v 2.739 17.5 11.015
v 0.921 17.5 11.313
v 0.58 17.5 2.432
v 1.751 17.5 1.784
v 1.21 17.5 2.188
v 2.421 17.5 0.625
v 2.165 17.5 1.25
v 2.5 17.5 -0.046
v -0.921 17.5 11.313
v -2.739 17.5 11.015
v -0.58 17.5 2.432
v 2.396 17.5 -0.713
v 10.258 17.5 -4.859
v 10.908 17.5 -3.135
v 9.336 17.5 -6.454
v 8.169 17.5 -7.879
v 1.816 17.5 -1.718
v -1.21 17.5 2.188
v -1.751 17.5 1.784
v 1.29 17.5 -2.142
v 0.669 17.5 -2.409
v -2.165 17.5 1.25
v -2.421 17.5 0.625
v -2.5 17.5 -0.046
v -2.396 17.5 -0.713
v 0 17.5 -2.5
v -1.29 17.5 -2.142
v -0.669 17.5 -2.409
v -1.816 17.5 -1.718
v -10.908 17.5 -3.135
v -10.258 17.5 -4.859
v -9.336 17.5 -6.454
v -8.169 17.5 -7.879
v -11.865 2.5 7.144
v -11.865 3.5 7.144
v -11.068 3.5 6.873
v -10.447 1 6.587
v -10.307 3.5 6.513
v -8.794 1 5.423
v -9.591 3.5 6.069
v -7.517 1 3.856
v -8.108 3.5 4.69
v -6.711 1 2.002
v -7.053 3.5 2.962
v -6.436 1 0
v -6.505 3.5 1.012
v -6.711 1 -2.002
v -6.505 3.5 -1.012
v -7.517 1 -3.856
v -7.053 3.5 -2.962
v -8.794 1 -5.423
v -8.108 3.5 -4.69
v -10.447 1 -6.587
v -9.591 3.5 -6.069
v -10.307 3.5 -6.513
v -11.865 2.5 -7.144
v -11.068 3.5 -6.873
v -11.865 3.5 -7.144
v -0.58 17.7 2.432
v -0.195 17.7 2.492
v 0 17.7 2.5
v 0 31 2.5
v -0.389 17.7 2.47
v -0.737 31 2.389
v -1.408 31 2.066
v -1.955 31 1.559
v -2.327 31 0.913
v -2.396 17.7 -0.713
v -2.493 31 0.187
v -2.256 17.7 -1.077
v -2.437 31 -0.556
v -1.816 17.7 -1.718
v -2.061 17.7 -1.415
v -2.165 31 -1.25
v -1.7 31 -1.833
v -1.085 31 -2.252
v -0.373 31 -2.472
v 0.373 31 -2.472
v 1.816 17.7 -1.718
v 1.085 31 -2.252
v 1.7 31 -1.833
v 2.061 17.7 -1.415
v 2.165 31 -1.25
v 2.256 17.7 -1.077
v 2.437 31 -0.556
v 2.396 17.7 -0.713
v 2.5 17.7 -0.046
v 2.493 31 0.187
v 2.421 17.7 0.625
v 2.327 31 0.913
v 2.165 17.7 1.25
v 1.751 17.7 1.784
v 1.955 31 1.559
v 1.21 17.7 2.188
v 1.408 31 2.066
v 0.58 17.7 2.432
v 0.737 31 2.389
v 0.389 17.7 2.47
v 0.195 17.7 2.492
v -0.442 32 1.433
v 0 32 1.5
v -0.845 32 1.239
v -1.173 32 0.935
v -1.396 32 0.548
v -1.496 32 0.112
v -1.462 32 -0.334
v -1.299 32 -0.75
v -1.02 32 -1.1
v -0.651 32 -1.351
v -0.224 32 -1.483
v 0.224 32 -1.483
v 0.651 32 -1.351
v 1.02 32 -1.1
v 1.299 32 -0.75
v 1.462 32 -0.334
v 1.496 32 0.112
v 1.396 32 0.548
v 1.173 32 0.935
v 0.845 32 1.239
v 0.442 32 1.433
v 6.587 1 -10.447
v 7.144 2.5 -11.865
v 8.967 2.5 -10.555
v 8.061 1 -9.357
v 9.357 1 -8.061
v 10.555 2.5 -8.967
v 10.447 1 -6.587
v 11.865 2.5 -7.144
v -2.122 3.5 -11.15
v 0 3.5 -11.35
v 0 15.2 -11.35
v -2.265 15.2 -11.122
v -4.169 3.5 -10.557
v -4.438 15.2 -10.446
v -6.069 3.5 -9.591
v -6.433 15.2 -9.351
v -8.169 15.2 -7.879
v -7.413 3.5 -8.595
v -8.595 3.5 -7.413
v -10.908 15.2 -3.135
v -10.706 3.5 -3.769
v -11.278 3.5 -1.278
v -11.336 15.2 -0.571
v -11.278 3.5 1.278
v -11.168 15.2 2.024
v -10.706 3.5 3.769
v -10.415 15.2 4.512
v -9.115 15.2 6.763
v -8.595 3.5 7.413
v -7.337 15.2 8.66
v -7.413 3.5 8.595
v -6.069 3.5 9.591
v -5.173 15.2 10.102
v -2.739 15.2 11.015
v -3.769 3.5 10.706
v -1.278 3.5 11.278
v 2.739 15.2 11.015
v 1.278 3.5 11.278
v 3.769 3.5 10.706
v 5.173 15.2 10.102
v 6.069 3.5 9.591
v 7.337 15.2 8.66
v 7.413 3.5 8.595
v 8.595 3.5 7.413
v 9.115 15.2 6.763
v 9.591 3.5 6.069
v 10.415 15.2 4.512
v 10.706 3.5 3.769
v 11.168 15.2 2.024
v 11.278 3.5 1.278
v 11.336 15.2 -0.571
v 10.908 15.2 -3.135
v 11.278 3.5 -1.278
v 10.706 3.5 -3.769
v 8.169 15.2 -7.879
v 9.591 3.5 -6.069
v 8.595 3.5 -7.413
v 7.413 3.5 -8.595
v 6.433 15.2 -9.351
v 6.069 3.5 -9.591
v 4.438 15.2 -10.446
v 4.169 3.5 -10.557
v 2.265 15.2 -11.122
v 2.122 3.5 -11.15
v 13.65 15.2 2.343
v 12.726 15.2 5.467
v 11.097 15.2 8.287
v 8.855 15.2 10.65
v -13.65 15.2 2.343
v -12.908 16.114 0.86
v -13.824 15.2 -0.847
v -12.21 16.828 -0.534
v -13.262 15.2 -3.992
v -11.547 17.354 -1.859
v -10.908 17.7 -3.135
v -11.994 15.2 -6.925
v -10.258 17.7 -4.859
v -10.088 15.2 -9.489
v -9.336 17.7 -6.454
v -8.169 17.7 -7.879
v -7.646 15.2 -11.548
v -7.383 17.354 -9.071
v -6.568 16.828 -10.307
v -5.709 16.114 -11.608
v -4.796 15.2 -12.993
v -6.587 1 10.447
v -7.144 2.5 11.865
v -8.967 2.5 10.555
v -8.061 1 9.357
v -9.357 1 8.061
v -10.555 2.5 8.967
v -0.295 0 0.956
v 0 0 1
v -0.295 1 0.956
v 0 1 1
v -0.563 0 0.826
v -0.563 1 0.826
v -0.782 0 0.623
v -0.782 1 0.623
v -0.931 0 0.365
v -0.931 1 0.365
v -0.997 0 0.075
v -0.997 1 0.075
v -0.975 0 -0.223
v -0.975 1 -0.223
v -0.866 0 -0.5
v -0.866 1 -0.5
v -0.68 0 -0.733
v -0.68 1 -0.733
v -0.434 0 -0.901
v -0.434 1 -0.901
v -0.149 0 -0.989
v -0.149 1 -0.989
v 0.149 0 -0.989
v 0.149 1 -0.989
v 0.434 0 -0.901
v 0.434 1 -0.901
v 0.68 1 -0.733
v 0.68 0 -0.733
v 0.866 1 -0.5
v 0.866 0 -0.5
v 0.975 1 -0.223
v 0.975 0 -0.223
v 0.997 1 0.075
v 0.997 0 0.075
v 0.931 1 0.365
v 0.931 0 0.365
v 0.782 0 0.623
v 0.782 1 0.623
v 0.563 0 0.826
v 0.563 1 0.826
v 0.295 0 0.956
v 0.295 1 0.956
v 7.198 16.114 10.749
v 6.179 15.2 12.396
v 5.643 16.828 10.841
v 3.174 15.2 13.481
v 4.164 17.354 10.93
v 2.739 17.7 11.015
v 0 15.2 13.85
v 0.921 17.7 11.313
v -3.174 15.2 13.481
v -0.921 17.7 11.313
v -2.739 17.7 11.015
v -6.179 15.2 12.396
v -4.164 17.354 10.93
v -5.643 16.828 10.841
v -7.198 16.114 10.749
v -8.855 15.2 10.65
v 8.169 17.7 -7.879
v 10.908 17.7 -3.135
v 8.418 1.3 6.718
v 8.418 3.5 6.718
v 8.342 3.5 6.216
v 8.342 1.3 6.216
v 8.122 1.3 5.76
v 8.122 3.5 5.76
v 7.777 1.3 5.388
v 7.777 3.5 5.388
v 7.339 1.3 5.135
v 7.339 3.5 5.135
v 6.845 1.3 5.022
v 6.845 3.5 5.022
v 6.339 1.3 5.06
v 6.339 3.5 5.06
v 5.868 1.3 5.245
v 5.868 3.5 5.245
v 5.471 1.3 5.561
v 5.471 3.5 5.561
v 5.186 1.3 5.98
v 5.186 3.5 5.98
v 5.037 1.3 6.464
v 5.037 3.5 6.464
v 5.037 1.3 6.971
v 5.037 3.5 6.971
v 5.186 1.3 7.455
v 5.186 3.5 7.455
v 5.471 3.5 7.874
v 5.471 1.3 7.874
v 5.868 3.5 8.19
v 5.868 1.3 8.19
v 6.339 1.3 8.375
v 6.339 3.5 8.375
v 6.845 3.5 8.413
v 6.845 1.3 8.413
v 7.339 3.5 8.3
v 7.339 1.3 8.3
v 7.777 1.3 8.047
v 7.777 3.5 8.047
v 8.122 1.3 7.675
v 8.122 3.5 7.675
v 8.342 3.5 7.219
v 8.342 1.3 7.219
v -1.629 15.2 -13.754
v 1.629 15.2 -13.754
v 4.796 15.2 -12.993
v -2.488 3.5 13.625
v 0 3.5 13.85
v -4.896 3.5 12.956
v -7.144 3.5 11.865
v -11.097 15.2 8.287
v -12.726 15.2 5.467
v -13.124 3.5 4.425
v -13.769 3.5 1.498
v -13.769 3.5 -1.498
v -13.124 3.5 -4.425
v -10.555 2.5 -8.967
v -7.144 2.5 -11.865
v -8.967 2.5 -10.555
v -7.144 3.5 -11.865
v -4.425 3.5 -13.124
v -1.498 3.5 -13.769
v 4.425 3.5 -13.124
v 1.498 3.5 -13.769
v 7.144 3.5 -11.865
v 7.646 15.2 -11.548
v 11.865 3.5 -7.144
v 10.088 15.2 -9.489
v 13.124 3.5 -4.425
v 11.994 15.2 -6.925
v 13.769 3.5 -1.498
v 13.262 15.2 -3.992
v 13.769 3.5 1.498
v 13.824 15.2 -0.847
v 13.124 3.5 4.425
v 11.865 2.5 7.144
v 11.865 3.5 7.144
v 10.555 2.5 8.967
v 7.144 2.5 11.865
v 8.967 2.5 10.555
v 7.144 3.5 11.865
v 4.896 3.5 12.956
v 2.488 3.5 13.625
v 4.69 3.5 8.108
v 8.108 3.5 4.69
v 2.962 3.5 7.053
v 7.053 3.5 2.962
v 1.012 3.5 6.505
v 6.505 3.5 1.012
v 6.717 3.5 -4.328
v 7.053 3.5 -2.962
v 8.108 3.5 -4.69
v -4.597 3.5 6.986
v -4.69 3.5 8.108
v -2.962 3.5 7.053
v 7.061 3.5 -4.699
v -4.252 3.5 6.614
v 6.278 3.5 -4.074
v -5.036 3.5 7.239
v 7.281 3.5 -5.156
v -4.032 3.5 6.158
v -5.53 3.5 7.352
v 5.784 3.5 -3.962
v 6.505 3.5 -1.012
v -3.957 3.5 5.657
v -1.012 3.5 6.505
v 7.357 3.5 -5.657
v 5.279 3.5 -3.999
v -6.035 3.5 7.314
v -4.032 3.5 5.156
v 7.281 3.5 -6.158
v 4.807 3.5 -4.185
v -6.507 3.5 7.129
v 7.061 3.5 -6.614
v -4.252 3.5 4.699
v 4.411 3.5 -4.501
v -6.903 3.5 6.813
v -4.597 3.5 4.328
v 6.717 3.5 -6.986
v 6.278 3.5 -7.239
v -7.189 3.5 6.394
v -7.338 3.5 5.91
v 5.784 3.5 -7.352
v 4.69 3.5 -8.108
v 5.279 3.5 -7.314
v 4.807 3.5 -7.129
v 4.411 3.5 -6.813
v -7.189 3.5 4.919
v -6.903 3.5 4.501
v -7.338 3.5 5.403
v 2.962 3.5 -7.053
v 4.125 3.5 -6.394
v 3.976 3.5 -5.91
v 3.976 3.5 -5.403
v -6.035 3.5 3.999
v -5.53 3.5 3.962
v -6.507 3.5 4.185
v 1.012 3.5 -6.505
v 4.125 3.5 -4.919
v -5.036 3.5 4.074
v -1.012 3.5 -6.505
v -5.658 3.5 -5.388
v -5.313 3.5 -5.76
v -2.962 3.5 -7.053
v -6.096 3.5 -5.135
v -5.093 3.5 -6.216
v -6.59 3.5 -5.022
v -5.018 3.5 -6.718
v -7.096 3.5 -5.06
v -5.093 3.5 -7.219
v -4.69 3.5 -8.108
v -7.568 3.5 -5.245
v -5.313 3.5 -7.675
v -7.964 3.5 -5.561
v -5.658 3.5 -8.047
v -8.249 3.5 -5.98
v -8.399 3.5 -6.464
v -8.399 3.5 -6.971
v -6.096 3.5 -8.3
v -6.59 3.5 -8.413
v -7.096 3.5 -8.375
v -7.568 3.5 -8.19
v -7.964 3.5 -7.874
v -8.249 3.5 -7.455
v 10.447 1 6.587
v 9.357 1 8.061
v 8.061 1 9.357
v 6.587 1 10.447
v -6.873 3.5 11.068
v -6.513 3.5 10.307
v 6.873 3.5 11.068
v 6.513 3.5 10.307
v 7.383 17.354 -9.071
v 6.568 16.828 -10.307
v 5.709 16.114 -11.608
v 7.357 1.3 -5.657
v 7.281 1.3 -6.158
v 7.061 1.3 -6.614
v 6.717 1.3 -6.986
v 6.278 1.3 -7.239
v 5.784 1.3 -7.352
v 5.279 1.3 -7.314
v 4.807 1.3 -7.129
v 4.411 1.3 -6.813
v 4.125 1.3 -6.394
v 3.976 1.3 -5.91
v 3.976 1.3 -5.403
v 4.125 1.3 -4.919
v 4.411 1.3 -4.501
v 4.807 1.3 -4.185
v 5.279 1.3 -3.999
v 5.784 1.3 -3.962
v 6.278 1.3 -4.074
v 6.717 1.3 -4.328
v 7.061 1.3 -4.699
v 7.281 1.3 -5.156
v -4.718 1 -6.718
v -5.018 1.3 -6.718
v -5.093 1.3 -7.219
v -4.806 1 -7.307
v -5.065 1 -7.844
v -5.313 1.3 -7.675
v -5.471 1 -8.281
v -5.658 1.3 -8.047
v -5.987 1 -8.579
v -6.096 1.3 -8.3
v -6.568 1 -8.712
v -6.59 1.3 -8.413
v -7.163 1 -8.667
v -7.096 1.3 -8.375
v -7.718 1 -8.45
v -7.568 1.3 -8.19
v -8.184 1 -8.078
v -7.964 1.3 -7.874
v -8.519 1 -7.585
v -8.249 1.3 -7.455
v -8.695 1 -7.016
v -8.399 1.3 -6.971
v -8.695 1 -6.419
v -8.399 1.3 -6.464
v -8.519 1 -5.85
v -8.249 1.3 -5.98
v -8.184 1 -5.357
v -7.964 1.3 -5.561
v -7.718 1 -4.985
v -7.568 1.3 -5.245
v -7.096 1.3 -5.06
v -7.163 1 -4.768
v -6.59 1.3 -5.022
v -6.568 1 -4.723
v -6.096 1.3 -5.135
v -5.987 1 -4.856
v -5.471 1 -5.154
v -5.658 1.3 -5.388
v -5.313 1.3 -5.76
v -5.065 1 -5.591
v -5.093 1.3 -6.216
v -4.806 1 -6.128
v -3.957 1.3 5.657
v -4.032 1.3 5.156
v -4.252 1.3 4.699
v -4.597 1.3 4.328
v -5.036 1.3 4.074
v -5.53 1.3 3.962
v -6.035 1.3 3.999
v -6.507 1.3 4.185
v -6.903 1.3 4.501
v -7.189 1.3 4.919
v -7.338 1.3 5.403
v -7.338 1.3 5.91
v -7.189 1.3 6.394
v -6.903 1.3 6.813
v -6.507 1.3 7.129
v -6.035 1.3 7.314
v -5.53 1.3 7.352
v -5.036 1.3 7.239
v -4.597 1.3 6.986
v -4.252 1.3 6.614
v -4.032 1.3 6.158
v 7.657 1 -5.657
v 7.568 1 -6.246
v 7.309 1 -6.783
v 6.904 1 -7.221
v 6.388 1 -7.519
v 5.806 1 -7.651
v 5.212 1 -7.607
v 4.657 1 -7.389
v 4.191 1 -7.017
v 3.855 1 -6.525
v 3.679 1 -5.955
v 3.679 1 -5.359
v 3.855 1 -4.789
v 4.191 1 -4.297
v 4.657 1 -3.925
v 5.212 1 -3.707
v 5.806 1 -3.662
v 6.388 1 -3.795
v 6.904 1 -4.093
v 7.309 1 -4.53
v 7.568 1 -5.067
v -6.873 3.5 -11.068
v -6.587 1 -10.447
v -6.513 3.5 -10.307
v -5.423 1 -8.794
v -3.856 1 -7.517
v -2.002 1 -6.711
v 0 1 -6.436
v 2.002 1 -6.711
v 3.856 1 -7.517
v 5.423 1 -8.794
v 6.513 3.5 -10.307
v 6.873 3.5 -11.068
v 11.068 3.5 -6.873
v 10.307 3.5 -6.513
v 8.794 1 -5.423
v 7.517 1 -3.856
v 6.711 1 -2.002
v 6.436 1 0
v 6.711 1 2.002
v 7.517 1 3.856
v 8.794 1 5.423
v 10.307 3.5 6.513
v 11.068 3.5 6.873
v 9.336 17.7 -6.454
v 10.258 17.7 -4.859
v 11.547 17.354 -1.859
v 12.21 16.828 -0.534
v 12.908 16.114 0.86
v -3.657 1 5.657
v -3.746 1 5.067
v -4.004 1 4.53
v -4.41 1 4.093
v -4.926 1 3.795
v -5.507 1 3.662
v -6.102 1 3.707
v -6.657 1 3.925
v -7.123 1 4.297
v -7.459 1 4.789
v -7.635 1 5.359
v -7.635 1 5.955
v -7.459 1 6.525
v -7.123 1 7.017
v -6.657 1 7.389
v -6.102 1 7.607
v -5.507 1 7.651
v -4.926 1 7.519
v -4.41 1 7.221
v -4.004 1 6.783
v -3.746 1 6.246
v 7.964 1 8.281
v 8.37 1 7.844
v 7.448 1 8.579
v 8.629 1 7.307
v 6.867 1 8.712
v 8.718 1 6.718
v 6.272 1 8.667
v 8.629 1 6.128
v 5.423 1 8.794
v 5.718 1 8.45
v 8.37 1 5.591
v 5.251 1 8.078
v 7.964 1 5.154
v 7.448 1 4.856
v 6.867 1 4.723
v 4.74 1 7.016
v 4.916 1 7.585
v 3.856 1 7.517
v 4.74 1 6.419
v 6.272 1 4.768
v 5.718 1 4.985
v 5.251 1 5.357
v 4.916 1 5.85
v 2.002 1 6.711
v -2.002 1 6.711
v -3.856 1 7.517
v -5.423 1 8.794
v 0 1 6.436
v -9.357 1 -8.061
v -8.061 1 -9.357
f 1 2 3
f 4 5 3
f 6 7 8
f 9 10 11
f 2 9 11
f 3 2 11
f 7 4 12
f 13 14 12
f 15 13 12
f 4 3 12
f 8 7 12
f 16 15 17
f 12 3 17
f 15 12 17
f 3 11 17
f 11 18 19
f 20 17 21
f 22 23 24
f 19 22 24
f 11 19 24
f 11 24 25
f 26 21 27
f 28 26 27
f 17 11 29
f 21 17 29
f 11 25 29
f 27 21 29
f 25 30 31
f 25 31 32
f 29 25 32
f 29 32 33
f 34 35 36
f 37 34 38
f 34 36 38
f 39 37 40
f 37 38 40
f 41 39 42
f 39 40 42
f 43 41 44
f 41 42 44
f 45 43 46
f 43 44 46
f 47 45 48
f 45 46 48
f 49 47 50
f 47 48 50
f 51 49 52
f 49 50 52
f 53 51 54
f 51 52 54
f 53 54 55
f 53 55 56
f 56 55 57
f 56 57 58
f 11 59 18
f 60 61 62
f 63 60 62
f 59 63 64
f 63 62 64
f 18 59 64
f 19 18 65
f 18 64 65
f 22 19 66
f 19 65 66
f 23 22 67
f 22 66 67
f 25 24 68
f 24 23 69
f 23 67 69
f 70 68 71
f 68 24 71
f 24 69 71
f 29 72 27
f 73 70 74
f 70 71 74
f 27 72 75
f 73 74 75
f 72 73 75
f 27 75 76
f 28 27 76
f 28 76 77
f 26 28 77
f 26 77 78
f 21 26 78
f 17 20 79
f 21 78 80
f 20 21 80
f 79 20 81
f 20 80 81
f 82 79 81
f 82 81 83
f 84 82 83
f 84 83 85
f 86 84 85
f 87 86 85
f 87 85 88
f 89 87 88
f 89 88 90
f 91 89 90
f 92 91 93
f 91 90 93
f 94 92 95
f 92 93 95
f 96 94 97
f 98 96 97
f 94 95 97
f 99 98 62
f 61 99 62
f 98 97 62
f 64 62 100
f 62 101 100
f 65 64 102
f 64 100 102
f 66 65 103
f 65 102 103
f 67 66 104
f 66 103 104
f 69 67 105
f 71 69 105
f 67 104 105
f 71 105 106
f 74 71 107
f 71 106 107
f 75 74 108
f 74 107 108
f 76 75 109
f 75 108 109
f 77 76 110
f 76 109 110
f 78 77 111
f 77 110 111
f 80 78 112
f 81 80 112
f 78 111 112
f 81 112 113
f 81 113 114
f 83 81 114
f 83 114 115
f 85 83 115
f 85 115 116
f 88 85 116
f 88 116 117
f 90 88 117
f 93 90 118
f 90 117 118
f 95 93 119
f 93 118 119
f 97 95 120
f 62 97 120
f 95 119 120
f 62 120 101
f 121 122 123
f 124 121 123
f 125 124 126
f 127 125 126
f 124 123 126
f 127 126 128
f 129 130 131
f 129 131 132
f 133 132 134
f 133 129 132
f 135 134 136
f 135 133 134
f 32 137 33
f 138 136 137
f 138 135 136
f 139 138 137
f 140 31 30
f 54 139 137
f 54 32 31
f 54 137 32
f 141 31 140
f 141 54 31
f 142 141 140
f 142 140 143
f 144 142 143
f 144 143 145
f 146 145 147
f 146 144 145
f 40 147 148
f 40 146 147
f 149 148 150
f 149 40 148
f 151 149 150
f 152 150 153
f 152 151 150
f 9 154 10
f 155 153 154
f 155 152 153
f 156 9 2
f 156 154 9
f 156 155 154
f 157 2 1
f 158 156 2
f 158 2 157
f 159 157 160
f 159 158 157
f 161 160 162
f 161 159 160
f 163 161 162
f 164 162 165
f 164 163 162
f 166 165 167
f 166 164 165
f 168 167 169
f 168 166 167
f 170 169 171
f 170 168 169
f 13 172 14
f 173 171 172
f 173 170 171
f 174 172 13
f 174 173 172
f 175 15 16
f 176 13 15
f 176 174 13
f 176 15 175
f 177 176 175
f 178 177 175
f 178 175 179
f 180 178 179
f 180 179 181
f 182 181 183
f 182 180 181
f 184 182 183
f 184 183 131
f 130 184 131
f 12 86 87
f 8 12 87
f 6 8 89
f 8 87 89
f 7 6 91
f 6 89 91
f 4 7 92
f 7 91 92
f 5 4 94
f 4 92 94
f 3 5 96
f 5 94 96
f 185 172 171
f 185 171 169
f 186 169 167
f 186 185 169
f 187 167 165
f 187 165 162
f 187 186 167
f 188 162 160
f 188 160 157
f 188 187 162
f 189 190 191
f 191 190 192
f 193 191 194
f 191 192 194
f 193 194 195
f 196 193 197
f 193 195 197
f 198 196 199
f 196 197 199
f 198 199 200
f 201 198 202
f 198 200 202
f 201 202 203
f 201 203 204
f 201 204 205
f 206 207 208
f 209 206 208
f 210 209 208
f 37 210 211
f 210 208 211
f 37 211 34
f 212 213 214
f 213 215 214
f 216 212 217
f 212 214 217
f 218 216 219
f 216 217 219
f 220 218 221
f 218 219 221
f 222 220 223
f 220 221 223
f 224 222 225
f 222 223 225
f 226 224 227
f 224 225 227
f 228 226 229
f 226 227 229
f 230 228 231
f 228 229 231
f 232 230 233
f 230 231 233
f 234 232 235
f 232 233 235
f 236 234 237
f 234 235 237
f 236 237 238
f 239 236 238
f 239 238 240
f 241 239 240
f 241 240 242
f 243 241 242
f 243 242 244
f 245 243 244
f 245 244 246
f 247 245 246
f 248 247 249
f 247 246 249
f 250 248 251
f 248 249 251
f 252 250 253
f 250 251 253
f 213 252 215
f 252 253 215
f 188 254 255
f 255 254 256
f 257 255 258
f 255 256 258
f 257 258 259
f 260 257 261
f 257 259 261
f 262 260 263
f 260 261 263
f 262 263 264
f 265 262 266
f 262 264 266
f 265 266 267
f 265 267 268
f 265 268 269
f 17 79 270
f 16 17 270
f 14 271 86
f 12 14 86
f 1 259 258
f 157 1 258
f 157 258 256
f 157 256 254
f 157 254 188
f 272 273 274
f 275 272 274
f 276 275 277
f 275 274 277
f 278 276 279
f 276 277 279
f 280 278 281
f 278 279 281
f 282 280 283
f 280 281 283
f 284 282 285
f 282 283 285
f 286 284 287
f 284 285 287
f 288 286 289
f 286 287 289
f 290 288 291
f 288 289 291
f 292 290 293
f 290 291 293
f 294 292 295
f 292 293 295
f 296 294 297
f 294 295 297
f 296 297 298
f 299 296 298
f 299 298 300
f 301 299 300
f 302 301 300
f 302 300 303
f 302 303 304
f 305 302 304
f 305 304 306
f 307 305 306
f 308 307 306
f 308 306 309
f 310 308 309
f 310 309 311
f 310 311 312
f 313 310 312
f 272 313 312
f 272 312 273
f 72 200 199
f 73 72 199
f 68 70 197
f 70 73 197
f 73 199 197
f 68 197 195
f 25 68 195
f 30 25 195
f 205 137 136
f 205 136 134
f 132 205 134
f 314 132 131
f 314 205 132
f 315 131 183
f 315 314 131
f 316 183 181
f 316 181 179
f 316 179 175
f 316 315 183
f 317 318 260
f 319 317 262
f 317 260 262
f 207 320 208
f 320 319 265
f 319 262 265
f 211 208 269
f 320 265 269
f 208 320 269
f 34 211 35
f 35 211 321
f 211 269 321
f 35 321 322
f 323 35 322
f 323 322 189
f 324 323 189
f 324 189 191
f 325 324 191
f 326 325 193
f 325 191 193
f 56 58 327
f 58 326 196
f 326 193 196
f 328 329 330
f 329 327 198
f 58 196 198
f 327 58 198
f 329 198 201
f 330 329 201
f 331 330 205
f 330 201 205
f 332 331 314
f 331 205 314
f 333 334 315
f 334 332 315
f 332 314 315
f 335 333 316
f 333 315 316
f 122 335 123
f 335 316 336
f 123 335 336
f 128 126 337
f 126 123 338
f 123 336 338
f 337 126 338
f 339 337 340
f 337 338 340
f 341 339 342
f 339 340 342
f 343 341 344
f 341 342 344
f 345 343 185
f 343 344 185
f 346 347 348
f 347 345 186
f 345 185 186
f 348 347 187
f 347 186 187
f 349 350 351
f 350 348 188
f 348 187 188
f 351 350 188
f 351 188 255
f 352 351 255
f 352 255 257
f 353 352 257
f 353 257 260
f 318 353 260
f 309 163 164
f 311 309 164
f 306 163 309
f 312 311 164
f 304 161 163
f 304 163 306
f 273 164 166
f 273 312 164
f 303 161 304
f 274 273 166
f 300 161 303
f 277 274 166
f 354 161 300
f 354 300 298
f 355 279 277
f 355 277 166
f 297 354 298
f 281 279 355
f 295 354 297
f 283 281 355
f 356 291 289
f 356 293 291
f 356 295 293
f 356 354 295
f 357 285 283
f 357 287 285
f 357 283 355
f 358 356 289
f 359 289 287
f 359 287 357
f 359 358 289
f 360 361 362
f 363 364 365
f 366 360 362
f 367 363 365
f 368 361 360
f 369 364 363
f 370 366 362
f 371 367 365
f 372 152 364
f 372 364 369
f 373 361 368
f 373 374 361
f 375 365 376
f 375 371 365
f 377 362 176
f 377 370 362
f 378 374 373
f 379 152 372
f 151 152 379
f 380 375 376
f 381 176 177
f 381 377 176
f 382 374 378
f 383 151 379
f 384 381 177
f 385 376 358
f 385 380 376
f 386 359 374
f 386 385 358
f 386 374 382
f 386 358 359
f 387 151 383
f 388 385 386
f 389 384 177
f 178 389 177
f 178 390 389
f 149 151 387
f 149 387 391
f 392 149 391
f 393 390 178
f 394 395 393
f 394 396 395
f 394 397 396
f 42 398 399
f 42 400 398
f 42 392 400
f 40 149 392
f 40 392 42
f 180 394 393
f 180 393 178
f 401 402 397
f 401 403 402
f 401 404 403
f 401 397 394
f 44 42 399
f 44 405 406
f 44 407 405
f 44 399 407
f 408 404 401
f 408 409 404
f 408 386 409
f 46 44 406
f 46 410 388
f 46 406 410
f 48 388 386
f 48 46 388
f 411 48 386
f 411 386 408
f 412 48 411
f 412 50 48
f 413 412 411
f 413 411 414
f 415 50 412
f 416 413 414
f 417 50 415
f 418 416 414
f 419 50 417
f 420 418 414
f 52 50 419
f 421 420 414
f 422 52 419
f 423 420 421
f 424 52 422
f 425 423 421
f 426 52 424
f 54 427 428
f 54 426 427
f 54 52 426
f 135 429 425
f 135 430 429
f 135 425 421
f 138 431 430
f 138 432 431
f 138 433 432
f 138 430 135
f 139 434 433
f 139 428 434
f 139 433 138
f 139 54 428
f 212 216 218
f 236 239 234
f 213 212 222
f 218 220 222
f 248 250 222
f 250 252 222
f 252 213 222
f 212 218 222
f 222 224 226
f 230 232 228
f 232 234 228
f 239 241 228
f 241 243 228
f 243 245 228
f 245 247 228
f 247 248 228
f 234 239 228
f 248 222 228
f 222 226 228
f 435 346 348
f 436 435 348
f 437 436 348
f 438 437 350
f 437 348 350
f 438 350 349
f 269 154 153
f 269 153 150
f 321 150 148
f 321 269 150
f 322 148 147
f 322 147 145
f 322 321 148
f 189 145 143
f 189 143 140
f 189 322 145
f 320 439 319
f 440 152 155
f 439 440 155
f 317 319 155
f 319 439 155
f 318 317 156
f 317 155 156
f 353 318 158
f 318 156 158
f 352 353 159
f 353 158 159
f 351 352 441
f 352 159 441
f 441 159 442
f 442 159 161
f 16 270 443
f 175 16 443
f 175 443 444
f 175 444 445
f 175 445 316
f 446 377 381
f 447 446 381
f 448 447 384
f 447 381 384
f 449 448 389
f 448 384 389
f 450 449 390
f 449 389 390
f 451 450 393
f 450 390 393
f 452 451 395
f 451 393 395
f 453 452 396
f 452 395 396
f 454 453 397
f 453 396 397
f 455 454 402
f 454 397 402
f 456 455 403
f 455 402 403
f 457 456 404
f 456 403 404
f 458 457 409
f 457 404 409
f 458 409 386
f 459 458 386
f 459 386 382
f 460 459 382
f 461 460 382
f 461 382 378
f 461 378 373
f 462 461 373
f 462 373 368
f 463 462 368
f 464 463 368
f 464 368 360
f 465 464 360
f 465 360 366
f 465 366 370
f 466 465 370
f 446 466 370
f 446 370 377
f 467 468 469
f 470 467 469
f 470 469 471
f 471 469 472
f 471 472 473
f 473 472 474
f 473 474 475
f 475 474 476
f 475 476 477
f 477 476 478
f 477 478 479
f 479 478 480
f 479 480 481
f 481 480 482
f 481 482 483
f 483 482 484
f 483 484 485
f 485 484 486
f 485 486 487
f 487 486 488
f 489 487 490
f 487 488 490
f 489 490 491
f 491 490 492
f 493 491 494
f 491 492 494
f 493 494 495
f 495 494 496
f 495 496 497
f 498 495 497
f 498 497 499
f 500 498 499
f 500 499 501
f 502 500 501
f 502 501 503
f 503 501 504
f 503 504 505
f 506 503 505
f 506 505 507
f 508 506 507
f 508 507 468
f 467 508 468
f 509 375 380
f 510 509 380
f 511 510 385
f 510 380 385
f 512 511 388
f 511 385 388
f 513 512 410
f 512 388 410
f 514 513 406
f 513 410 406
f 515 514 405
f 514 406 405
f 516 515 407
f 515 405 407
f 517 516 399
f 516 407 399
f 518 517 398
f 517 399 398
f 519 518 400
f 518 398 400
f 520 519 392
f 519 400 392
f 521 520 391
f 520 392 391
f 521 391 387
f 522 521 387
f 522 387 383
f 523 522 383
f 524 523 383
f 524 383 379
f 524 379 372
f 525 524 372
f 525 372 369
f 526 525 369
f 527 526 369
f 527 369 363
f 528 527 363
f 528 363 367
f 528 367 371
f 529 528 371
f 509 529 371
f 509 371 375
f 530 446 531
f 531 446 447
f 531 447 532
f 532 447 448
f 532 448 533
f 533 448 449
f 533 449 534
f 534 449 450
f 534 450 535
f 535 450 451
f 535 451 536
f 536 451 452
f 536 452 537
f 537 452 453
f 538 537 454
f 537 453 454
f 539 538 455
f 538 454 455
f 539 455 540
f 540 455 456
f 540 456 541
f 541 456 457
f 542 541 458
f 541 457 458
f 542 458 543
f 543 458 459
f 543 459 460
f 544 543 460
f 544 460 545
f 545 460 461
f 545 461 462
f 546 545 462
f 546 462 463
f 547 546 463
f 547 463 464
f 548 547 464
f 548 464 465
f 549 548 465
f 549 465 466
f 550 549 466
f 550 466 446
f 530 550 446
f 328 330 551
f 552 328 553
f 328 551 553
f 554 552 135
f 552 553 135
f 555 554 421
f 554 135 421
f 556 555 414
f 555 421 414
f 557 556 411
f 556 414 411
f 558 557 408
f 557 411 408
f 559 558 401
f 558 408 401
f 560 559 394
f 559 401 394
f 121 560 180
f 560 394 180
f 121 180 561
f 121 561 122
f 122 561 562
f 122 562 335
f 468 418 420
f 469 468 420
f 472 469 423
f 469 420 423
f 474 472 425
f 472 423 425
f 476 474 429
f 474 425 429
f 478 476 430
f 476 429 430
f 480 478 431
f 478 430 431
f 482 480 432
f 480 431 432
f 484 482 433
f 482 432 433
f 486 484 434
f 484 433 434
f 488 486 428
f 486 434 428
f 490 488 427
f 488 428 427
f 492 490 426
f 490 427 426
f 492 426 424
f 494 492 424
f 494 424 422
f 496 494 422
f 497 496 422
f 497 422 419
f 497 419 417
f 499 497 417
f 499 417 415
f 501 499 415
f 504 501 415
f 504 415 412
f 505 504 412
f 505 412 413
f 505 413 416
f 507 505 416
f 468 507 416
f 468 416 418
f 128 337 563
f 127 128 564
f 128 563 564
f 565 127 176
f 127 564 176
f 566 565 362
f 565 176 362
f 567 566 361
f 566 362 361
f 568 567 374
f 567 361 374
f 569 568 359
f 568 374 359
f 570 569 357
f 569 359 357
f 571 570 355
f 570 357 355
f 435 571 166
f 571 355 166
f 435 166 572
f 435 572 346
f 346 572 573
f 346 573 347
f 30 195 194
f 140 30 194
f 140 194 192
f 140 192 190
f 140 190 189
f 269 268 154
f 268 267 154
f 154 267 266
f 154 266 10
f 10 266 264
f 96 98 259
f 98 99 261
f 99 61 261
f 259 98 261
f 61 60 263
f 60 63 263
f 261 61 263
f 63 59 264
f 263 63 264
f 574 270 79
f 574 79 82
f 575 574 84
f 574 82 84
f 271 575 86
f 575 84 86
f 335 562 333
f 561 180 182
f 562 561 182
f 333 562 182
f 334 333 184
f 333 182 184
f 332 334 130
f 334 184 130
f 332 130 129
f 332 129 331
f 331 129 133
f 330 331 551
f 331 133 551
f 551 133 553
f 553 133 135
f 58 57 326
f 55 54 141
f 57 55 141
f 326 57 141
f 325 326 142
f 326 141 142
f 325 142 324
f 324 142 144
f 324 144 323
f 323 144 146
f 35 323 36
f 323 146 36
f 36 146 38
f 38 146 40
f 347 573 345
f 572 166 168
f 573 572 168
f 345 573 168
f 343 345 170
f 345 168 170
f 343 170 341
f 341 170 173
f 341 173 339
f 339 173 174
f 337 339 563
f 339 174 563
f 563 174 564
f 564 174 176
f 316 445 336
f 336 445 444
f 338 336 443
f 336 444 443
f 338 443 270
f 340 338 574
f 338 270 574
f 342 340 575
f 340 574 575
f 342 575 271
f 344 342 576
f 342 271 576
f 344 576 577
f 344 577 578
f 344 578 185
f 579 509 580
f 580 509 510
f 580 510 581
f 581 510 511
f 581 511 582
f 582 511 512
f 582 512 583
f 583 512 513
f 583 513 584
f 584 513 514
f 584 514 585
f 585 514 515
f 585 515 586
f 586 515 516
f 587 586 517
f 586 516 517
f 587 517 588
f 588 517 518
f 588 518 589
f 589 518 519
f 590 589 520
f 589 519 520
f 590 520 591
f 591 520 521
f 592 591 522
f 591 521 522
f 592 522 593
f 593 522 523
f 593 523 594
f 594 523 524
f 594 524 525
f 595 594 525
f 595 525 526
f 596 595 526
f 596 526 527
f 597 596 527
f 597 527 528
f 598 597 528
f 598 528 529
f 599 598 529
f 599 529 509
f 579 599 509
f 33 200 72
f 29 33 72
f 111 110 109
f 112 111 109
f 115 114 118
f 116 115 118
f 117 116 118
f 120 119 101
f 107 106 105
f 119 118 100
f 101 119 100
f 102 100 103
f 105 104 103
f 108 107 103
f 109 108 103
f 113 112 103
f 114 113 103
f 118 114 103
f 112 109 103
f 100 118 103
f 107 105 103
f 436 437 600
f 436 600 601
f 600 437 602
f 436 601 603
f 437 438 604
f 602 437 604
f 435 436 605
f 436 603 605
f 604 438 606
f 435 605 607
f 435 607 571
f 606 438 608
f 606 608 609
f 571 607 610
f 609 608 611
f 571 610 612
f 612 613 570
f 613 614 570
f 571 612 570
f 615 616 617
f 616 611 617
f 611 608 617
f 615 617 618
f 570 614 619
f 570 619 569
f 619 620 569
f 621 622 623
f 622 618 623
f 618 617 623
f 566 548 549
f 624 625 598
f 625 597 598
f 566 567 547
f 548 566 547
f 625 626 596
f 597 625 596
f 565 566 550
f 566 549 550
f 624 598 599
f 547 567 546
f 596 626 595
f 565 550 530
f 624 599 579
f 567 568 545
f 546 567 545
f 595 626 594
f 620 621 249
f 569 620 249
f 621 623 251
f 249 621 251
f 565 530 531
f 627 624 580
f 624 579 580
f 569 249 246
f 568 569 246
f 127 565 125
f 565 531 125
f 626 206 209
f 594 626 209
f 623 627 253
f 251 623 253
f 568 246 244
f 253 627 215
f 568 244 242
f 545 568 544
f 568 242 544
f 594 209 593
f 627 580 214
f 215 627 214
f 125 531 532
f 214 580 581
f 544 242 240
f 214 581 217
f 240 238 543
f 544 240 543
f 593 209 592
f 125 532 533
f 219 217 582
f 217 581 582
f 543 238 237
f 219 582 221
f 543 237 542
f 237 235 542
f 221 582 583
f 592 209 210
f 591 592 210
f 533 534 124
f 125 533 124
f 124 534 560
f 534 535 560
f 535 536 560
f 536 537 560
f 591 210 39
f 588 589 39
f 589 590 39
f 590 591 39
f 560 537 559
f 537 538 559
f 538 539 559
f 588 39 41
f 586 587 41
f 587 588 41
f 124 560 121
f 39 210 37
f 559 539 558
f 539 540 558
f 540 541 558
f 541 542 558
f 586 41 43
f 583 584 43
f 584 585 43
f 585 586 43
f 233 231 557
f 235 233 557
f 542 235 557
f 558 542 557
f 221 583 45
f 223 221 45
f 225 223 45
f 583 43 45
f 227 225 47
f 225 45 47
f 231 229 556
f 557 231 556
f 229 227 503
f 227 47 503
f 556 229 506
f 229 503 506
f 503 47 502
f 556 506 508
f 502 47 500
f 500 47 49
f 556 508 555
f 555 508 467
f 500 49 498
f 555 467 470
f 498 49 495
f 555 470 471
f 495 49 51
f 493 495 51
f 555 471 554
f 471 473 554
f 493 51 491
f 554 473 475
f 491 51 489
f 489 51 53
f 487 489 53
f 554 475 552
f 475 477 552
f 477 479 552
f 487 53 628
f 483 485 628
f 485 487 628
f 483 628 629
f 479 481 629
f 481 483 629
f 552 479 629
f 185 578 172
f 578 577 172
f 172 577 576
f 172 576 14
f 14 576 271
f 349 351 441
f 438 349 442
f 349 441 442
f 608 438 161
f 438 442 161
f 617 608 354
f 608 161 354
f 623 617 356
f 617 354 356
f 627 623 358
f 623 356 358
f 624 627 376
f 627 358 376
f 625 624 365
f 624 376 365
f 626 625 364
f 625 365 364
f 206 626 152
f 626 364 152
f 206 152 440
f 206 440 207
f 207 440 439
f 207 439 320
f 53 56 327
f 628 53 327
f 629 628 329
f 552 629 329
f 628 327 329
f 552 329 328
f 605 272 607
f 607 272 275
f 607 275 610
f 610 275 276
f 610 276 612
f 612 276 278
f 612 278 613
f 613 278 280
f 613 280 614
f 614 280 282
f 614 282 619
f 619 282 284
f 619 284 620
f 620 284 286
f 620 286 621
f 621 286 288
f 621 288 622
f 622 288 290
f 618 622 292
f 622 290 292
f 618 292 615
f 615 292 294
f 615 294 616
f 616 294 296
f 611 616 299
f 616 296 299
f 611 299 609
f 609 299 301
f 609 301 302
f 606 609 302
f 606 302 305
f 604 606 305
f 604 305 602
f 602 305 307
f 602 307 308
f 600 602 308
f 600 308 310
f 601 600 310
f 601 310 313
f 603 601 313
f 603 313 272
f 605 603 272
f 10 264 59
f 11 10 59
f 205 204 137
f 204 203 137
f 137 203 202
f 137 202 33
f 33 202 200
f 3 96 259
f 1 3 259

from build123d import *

# Parameters (mm, degrees)
SKETCH2_R                                     = 11.35
CUT_EXTRUDE1_DEPTH                            = 14
SKETCH3_R                                     = 7.414246795
CUT_EXTRUDE2_DEPTH                            = 35.581714822
CIRPATTERN1_COUNT                             = 4
CSK_FOR_M3_COUNTERSUNK_FLAT_HEAD1_D           = 3.4
CSK_FOR_M3_COUNTERSUNK_FLAT_HEAD1_DEPTH       = 2.5
CSK_FOR_M3_COUNTERSUNK_FLAT_HEAD1_CSINK_D     = 4
CSK_FOR_M3_COUNTERSUNK_FLAT_HEAD1_CSINK_ANGLE = 90
CSK_FOR_M3_COUNTERSUNK_FLAT_HEAD3_D           = 3.4
CSK_FOR_M3_COUNTERSUNK_FLAT_HEAD3_DEPTH       = 2.5
CSK_FOR_M3_COUNTERSUNK_FLAT_HEAD3_CSINK_D     = 4
CSK_FOR_M3_COUNTERSUNK_FLAT_HEAD3_CSINK_ANGLE = 90
CUT_EXTRUDE4_DEPTH                            = 2.5
CIRPATTERN2_COUNT                             = 3


with BuildPart() as part:
    # Sketch1 → Revolve1 (revolve)
    with BuildSketch(Plane.XY, mode=Mode.PRIVATE) as revolve1_sk:
        Polygon((0, 0), (-1, 0), (-1, 1), (-12.35, 1), (-13.85, 2.5), (-13.85, 15.2), (-11.35, 17.7), (-2.5, 17.7), (-2.5, 31), (-1.5, 32), (0, 32), align=None)
    revolve(revolve1_sk.sketch.rotate(Axis((0, 41.020495061, 0), (0, -1, 0)), 270), axis=Axis((0, 41.020495061, 0), (0, -1, 0)))

    # Sketch2 → Cut-Extrude1 (cut)
    with BuildSketch(Plane(origin=(0, 3.5, 0), x_dir=(1, 0, 0), z_dir=(0, 1, 0))):
        with Locations(Location((0, 0, 0), (0, 0, 90))):
            Circle(SKETCH2_R)
    extrude(amount=CUT_EXTRUDE1_DEPTH, mode=Mode.SUBTRACT)

    # Sketch3 → Cut-Extrude2 (cut, through all)
    with BuildSketch(Plane(origin=(0, 3.5, 0), x_dir=(1, 0, 0), z_dir=(0, 1, 0))):
        with Locations((0, -13.85)):
            Circle(SKETCH3_R)
    cut_extrude2 = extrude(amount=-CUT_EXTRUDE2_DEPTH, mode=Mode.SUBTRACT)

    # CirPattern1: Cut-Extrude2 ×4 about axis
    cirpattern1_axis = Axis((0, 0, 0), (0, 1, 0))
    for i in range(1, CIRPATTERN1_COUNT):
        add(cut_extrude2.rotate(cirpattern1_axis, i * 360 / CIRPATTERN1_COUNT), mode=Mode.SUBTRACT)

    # CSK for M3 Countersunk Flat Head1
    with Locations(Plane(origin=(0, 1, 0), x_dir=(-1, 0, 0), z_dir=(0, -1, 0))):
        with Locations((5.656854249, -5.656854249), (-5.656854249, 5.656854249)):
            CounterSinkHole(CSK_FOR_M3_COUNTERSUNK_FLAT_HEAD1_D / 2, CSK_FOR_M3_COUNTERSUNK_FLAT_HEAD1_CSINK_D / 2, depth=CSK_FOR_M3_COUNTERSUNK_FLAT_HEAD1_DEPTH, counter_sink_angle=CSK_FOR_M3_COUNTERSUNK_FLAT_HEAD1_CSINK_ANGLE)

    # CSK for M3 Countersunk Flat Head3
    with Locations(Plane(origin=(0, 1, 0), x_dir=(-1, 0, 0), z_dir=(0, -1, 0))):
        with Locations((6.717514421, 6.717514421), (-6.717514421, -6.717514421)):
            CounterSinkHole(CSK_FOR_M3_COUNTERSUNK_FLAT_HEAD3_D / 2, CSK_FOR_M3_COUNTERSUNK_FLAT_HEAD3_CSINK_D / 2, depth=CSK_FOR_M3_COUNTERSUNK_FLAT_HEAD3_DEPTH, counter_sink_angle=CSK_FOR_M3_COUNTERSUNK_FLAT_HEAD3_CSINK_ANGLE)

    # Sketch16 → Cut-Extrude4 (cut)
    with BuildSketch(Plane(origin=(0, 17.7, 0), x_dir=(1, 0, 0), z_dir=(0, 1, 0))):
        with BuildLine():
            Line((-4.79581004, 12.993179213), (-8.169414432, 7.879287267))
            Line((-8.169414432, 7.879287267), (-1.815909947, 1.718275607))
            ThreePointArc((-1.815909947, 1.718275607), (0, 2.5), (1.815909947, 1.718275607))
            Line((1.815909947, 1.718275607), (8.169414432, 7.879287267))
            Line((8.169414432, 7.879287267), (4.79581004, 12.993179213))
            Line((4.79581004, 12.993179213), (0, 16.897060704))
            Line((0, 16.897060704), (-4.79581004, 12.993179213))
        make_face()
    cut_extrude4 = extrude(amount=-CUT_EXTRUDE4_DEPTH, mode=Mode.SUBTRACT)

    # CirPattern2: Cut-Extrude4 ×3 about axis
    cirpattern2_axis = Axis((0, 0, 0), (0, 1, 0))
    for i in range(1, CIRPATTERN2_COUNT):
        add(cut_extrude4.rotate(cirpattern2_axis, i * 360 / CIRPATTERN2_COUNT), mode=Mode.SUBTRACT)


solid = part.part
